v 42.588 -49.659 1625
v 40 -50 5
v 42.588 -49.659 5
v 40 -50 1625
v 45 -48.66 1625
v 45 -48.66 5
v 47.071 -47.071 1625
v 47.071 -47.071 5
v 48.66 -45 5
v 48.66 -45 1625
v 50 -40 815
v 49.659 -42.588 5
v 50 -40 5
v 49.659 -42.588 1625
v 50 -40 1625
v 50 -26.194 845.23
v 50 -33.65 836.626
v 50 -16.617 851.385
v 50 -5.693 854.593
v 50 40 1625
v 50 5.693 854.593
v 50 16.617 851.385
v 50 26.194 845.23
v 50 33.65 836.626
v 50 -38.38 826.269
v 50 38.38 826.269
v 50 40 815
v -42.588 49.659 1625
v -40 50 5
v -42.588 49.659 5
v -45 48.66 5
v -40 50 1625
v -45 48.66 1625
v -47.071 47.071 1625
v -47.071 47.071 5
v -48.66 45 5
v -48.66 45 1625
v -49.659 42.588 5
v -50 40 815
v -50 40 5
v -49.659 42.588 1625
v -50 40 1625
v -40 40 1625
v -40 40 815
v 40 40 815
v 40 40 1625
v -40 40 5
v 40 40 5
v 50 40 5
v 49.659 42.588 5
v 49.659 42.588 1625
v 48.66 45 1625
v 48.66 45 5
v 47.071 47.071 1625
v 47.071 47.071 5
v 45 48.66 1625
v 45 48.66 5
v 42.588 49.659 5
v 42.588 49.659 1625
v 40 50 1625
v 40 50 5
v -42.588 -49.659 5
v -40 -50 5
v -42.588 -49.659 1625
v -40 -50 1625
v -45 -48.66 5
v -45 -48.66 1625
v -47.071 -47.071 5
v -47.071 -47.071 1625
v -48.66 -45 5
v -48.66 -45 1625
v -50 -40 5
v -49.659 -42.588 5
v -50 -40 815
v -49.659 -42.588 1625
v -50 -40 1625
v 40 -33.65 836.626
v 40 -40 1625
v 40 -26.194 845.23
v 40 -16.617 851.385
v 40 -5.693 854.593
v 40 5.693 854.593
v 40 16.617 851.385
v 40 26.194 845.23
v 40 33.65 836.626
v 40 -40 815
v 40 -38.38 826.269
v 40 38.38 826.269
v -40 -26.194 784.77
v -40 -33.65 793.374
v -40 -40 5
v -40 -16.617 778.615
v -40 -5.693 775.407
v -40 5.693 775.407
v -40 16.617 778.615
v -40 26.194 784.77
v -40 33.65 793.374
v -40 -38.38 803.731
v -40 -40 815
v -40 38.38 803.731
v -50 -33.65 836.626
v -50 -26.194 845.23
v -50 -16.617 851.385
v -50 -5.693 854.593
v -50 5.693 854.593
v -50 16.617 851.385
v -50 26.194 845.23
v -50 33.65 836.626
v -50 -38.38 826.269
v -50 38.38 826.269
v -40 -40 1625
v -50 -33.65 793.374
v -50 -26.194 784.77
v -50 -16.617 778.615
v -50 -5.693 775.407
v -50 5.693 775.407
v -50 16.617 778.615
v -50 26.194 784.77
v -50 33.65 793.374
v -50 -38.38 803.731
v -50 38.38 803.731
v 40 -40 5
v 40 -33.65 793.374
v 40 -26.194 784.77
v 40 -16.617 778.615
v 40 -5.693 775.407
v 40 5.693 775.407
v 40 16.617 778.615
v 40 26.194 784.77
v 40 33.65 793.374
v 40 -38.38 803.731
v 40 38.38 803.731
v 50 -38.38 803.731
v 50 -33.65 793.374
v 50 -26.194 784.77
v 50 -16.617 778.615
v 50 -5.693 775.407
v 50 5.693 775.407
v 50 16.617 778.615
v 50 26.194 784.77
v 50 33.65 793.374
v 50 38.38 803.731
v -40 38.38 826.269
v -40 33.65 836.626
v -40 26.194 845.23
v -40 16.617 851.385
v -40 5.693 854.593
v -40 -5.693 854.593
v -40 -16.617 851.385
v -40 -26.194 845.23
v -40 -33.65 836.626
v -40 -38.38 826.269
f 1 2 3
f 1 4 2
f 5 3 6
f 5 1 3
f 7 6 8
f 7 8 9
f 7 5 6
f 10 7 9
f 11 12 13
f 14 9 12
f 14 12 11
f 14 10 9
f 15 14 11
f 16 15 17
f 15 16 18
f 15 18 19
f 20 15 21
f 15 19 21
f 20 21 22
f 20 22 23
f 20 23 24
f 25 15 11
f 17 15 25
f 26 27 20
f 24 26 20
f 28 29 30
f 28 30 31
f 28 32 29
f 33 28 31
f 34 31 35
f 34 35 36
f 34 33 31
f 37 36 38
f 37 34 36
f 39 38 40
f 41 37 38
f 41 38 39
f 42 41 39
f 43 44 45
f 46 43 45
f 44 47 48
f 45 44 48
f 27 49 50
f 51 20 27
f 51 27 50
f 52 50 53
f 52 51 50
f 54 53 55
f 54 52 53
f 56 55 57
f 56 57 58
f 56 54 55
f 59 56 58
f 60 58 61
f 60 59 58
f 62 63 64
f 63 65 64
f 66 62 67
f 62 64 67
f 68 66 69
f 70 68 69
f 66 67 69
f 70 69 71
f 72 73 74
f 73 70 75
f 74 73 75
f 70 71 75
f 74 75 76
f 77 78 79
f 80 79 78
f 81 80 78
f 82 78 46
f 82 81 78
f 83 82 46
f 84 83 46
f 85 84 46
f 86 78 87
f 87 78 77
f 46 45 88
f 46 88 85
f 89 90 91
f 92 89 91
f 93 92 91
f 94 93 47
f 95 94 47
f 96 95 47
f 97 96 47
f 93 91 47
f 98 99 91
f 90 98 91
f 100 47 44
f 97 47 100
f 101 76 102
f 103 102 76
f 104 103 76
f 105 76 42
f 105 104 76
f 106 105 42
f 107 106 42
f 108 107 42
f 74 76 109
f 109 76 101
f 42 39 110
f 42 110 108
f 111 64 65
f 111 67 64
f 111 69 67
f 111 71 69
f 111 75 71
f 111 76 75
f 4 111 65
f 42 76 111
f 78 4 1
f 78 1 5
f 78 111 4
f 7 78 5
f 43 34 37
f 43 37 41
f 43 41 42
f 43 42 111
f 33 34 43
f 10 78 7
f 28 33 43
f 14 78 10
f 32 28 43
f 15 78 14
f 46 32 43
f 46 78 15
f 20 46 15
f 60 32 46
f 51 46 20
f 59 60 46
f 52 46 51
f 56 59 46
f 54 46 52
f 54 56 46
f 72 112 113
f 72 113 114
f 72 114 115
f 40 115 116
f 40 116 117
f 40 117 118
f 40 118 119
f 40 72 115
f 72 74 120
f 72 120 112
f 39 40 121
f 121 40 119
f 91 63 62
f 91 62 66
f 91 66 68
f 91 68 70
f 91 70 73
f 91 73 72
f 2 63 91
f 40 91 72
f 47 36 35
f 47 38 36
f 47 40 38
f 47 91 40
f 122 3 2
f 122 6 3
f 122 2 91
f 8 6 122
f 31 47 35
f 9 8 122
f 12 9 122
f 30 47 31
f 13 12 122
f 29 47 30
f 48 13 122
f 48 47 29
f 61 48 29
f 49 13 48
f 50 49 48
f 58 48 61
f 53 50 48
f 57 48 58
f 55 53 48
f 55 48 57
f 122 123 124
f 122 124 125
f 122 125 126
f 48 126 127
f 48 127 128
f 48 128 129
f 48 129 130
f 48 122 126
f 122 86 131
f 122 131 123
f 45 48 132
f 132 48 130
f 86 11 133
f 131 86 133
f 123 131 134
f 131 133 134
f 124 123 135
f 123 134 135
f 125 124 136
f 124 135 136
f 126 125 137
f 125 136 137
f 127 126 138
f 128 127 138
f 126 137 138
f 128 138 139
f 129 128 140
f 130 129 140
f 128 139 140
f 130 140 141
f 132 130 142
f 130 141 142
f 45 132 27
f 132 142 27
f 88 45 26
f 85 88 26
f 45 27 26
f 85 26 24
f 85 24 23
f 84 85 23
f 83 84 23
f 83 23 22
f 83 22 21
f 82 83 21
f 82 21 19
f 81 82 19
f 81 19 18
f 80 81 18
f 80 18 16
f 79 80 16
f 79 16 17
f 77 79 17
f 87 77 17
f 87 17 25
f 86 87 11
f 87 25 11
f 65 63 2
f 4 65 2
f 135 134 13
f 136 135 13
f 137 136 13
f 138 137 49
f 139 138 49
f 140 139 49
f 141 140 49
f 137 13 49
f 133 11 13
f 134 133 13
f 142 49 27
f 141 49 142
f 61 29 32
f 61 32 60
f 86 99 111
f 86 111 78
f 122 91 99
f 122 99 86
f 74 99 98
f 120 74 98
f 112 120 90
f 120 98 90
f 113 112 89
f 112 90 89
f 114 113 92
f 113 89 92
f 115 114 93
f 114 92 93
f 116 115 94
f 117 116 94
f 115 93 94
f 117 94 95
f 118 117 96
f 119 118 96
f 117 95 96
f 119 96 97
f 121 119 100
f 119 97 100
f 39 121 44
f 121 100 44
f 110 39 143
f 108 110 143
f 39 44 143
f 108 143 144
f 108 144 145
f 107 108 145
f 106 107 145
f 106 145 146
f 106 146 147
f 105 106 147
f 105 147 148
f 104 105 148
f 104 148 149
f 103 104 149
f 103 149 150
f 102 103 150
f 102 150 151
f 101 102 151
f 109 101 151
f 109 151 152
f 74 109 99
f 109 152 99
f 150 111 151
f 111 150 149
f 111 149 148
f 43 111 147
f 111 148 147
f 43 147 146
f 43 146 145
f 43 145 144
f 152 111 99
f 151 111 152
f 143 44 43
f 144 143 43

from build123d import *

# Parameters (mm, degrees)
SKETCH1_W           = 120
SKETCH1_H           = 120
BOSS_EXTRUDE1_DEPTH = 5
SKETCH2_W           = 100
SKETCH2_H           = 100
SKETCH2_W_2         = 80
SKETCH2_H_2         = 80
EXTRUDE_THIN1_DEPTH = 1620
FILLET1_R           = 10
SKETCH4_W           = 28.971165854
SKETCH4_H           = 139.886747586
CUT_EXTRUDE1_DEPTH  = 1631.529055246
SKETCH5_R           = 40
CUT_EXTRUDE2_DEPTH  = 1629.841612926


with BuildPart() as part:
    # Sketch1 → Boss-Extrude1 (new body)
    with BuildSketch(Plane.XY):
        Rectangle(SKETCH1_W, SKETCH1_H)
    extrude(amount=BOSS_EXTRUDE1_DEPTH)

    # Sketch2 → Extrude-Thin1 (add)
    with BuildSketch(Plane.XY.offset(5)):
        Rectangle(SKETCH2_W, SKETCH2_H)
        Rectangle(SKETCH2_W_2, SKETCH2_H_2, mode=Mode.SUBTRACT)
    extrude(amount=EXTRUDE_THIN1_DEPTH)

    # Fillet1
    fillet1_edges = [part.edges().sort_by_distance(p)[0] for p in [
        (50, -50, 815),
        (50, 50, 815),
        (-50, 50, 815),
        (-50, -50, 815),
    ]]
    fillet(fillet1_edges, radius=FILLET1_R)

    # Sketch4 → Cut-Extrude1 (cut, through all)
    with BuildSketch(Plane(origin=(60, 0, 0), x_dir=(0, 0, -1), z_dir=(1, 0, 0))):
        with Locations((9.485582927, 4.056648122)):
            Rectangle(SKETCH4_W, SKETCH4_H)
    extrude(amount=-CUT_EXTRUDE1_DEPTH, mode=Mode.SUBTRACT)

    # Sketch5 → Cut-Extrude2 (cut, through all)
    with BuildSketch(Plane(origin=(50, 0, 0), x_dir=(0, 0, -1), z_dir=(1, 0, 0))):
        with Locations(Location((-815, 0, 0), (0, 0, 270))):
            Circle(SKETCH5_R)
    extrude(amount=-CUT_EXTRUDE2_DEPTH, mode=Mode.SUBTRACT)


solid = part.part
